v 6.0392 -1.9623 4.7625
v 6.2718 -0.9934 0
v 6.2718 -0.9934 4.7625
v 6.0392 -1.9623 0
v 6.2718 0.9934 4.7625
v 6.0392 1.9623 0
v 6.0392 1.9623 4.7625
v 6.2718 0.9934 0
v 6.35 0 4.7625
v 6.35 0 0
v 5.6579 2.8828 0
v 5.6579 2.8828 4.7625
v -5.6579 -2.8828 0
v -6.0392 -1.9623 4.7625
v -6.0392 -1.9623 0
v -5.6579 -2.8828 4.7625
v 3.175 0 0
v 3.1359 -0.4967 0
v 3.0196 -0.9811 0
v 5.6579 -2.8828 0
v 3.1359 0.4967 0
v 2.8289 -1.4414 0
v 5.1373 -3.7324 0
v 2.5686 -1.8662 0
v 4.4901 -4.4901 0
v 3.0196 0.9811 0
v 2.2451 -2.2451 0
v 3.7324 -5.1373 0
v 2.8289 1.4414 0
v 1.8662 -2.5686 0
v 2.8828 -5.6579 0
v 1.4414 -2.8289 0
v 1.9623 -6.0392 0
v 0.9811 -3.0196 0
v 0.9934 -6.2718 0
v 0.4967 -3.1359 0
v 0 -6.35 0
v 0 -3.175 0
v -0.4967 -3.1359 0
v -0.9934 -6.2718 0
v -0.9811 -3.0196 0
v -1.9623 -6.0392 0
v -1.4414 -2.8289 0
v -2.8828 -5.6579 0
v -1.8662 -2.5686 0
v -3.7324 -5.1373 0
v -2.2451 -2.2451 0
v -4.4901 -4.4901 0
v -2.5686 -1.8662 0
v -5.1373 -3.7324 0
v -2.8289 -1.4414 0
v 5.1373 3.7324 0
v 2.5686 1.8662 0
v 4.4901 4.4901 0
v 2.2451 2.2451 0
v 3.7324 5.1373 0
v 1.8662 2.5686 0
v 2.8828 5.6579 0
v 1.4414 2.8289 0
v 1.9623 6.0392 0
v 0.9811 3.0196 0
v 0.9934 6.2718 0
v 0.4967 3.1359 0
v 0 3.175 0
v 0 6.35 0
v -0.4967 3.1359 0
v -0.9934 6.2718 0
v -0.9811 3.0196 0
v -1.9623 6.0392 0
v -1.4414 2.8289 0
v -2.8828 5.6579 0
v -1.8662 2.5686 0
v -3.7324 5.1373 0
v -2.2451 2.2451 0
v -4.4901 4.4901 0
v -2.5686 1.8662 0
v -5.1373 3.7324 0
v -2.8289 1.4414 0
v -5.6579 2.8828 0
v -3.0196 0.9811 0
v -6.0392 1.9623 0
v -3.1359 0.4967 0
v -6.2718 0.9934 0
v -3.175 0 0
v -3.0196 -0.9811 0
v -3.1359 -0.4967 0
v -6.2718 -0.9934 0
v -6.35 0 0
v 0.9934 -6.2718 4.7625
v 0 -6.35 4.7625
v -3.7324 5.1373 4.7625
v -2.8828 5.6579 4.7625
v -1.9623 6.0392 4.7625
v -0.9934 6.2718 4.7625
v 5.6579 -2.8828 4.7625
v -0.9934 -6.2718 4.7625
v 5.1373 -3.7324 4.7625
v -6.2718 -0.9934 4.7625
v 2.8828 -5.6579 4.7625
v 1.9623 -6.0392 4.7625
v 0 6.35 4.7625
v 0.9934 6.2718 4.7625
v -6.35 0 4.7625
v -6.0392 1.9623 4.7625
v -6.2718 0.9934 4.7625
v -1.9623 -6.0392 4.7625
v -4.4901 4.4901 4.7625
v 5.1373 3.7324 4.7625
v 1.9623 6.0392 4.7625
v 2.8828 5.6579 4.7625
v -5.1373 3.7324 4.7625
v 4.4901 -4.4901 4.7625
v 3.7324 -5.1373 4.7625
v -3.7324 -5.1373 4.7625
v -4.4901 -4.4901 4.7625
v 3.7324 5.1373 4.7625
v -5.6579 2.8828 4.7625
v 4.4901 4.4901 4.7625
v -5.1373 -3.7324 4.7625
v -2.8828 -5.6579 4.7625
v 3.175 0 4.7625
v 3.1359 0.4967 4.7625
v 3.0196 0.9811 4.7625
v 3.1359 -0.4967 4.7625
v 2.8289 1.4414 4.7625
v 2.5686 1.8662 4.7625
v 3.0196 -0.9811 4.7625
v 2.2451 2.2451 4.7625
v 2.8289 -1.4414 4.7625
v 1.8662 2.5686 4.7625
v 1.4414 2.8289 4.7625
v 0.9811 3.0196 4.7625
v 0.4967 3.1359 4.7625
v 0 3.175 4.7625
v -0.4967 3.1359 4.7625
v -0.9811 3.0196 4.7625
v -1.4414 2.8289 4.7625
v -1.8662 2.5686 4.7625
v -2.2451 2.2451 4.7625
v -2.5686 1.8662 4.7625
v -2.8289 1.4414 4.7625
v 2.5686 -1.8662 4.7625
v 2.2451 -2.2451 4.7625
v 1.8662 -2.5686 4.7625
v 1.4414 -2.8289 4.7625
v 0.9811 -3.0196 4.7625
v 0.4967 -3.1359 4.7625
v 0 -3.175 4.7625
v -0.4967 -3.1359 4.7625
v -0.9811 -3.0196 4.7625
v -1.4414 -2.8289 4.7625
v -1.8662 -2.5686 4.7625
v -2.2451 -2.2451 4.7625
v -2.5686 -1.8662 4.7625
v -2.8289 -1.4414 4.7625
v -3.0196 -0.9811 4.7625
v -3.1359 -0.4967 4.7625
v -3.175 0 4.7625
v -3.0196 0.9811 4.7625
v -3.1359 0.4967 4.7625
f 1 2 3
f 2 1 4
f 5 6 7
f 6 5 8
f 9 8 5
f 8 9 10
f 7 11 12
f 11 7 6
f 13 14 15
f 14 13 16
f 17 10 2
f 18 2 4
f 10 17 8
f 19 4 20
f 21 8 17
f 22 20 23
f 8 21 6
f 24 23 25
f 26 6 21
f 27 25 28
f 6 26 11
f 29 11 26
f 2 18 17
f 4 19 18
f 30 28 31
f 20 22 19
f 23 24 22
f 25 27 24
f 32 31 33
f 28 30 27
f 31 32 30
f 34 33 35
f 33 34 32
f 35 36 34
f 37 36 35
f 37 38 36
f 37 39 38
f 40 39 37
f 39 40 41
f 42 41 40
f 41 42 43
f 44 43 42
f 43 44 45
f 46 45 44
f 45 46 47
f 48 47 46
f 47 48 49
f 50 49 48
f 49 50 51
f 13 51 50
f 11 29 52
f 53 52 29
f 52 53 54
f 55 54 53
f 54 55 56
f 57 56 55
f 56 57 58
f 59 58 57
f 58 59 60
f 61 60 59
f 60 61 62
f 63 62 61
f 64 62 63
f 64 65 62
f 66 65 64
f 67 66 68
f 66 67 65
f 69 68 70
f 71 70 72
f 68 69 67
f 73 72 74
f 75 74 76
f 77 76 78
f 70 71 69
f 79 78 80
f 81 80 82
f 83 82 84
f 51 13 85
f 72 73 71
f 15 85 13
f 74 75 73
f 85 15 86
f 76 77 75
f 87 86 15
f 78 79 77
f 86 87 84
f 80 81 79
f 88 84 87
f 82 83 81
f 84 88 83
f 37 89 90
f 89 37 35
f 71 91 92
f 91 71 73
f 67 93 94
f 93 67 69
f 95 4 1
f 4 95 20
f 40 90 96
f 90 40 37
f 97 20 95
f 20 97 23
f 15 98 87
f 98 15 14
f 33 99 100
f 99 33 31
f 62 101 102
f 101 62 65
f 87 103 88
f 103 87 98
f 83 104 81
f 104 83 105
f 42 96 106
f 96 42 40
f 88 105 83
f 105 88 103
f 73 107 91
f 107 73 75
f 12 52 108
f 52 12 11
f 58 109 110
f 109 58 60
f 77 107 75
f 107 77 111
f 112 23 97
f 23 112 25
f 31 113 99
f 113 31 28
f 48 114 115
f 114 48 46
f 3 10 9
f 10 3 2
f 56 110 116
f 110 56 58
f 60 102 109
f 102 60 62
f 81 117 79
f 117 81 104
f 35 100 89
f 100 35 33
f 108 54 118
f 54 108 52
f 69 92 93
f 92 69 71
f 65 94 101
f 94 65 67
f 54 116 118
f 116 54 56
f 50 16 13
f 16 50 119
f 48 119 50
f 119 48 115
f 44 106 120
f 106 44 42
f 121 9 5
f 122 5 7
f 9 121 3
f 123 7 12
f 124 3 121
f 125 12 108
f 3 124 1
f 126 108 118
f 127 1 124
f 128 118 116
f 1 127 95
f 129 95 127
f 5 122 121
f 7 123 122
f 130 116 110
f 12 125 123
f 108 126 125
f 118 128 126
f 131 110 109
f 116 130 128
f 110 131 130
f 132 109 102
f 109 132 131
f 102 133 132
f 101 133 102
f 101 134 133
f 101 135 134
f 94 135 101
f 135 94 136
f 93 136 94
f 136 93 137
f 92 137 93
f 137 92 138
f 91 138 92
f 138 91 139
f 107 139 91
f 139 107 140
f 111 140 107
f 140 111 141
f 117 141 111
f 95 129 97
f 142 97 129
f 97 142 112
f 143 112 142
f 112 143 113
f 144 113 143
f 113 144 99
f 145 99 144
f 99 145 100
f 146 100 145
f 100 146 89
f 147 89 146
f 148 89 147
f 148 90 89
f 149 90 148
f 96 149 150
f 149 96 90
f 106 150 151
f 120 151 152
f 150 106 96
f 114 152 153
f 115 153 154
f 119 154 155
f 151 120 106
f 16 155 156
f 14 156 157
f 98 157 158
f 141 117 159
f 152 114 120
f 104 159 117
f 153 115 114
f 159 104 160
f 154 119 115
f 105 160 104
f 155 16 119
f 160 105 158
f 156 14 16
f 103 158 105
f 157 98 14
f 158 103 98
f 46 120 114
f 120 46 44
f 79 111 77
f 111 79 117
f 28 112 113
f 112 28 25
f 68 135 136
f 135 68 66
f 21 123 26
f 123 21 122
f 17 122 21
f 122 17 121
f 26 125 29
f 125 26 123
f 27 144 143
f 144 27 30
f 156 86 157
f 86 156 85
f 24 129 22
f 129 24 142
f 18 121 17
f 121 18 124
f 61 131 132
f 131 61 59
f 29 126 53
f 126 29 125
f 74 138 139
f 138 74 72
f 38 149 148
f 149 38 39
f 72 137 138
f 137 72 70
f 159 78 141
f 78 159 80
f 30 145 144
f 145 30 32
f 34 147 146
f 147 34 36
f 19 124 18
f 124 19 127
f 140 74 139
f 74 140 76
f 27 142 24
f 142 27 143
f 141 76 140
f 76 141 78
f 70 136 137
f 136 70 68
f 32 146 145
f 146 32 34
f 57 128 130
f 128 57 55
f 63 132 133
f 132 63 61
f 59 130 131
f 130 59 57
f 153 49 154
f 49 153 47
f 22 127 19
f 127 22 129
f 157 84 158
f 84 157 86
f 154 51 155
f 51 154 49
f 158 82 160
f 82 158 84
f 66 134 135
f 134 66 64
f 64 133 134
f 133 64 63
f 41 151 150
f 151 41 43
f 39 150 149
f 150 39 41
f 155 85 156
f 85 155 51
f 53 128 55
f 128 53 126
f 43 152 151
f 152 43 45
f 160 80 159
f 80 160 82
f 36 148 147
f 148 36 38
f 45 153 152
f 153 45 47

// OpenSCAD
// Need to create spacer for mounting a monitor to a VERA mount, as the
// provided washers/spacers are too long.

// inch in mm
in = 25.4;

// inside diamter; match original
// measured at 6.4 mm; assume 1/4"
inside_d = 1/4 * in;


// outside diamter; match original
// measured at 12.27mm; assume 1/2"
outside_d = 1/2 * in;

// height; original was 1/2"
// measued at 12.98 mm; assume 1/2"
// do 1/8" or 3/16"?
height = 3/16 * in;

// change circle resolution
$fn = 4 * 10;

difference() {
    cylinder(h = height, d = outside_d);

    cylinder(h = height, d = inside_d);
}
